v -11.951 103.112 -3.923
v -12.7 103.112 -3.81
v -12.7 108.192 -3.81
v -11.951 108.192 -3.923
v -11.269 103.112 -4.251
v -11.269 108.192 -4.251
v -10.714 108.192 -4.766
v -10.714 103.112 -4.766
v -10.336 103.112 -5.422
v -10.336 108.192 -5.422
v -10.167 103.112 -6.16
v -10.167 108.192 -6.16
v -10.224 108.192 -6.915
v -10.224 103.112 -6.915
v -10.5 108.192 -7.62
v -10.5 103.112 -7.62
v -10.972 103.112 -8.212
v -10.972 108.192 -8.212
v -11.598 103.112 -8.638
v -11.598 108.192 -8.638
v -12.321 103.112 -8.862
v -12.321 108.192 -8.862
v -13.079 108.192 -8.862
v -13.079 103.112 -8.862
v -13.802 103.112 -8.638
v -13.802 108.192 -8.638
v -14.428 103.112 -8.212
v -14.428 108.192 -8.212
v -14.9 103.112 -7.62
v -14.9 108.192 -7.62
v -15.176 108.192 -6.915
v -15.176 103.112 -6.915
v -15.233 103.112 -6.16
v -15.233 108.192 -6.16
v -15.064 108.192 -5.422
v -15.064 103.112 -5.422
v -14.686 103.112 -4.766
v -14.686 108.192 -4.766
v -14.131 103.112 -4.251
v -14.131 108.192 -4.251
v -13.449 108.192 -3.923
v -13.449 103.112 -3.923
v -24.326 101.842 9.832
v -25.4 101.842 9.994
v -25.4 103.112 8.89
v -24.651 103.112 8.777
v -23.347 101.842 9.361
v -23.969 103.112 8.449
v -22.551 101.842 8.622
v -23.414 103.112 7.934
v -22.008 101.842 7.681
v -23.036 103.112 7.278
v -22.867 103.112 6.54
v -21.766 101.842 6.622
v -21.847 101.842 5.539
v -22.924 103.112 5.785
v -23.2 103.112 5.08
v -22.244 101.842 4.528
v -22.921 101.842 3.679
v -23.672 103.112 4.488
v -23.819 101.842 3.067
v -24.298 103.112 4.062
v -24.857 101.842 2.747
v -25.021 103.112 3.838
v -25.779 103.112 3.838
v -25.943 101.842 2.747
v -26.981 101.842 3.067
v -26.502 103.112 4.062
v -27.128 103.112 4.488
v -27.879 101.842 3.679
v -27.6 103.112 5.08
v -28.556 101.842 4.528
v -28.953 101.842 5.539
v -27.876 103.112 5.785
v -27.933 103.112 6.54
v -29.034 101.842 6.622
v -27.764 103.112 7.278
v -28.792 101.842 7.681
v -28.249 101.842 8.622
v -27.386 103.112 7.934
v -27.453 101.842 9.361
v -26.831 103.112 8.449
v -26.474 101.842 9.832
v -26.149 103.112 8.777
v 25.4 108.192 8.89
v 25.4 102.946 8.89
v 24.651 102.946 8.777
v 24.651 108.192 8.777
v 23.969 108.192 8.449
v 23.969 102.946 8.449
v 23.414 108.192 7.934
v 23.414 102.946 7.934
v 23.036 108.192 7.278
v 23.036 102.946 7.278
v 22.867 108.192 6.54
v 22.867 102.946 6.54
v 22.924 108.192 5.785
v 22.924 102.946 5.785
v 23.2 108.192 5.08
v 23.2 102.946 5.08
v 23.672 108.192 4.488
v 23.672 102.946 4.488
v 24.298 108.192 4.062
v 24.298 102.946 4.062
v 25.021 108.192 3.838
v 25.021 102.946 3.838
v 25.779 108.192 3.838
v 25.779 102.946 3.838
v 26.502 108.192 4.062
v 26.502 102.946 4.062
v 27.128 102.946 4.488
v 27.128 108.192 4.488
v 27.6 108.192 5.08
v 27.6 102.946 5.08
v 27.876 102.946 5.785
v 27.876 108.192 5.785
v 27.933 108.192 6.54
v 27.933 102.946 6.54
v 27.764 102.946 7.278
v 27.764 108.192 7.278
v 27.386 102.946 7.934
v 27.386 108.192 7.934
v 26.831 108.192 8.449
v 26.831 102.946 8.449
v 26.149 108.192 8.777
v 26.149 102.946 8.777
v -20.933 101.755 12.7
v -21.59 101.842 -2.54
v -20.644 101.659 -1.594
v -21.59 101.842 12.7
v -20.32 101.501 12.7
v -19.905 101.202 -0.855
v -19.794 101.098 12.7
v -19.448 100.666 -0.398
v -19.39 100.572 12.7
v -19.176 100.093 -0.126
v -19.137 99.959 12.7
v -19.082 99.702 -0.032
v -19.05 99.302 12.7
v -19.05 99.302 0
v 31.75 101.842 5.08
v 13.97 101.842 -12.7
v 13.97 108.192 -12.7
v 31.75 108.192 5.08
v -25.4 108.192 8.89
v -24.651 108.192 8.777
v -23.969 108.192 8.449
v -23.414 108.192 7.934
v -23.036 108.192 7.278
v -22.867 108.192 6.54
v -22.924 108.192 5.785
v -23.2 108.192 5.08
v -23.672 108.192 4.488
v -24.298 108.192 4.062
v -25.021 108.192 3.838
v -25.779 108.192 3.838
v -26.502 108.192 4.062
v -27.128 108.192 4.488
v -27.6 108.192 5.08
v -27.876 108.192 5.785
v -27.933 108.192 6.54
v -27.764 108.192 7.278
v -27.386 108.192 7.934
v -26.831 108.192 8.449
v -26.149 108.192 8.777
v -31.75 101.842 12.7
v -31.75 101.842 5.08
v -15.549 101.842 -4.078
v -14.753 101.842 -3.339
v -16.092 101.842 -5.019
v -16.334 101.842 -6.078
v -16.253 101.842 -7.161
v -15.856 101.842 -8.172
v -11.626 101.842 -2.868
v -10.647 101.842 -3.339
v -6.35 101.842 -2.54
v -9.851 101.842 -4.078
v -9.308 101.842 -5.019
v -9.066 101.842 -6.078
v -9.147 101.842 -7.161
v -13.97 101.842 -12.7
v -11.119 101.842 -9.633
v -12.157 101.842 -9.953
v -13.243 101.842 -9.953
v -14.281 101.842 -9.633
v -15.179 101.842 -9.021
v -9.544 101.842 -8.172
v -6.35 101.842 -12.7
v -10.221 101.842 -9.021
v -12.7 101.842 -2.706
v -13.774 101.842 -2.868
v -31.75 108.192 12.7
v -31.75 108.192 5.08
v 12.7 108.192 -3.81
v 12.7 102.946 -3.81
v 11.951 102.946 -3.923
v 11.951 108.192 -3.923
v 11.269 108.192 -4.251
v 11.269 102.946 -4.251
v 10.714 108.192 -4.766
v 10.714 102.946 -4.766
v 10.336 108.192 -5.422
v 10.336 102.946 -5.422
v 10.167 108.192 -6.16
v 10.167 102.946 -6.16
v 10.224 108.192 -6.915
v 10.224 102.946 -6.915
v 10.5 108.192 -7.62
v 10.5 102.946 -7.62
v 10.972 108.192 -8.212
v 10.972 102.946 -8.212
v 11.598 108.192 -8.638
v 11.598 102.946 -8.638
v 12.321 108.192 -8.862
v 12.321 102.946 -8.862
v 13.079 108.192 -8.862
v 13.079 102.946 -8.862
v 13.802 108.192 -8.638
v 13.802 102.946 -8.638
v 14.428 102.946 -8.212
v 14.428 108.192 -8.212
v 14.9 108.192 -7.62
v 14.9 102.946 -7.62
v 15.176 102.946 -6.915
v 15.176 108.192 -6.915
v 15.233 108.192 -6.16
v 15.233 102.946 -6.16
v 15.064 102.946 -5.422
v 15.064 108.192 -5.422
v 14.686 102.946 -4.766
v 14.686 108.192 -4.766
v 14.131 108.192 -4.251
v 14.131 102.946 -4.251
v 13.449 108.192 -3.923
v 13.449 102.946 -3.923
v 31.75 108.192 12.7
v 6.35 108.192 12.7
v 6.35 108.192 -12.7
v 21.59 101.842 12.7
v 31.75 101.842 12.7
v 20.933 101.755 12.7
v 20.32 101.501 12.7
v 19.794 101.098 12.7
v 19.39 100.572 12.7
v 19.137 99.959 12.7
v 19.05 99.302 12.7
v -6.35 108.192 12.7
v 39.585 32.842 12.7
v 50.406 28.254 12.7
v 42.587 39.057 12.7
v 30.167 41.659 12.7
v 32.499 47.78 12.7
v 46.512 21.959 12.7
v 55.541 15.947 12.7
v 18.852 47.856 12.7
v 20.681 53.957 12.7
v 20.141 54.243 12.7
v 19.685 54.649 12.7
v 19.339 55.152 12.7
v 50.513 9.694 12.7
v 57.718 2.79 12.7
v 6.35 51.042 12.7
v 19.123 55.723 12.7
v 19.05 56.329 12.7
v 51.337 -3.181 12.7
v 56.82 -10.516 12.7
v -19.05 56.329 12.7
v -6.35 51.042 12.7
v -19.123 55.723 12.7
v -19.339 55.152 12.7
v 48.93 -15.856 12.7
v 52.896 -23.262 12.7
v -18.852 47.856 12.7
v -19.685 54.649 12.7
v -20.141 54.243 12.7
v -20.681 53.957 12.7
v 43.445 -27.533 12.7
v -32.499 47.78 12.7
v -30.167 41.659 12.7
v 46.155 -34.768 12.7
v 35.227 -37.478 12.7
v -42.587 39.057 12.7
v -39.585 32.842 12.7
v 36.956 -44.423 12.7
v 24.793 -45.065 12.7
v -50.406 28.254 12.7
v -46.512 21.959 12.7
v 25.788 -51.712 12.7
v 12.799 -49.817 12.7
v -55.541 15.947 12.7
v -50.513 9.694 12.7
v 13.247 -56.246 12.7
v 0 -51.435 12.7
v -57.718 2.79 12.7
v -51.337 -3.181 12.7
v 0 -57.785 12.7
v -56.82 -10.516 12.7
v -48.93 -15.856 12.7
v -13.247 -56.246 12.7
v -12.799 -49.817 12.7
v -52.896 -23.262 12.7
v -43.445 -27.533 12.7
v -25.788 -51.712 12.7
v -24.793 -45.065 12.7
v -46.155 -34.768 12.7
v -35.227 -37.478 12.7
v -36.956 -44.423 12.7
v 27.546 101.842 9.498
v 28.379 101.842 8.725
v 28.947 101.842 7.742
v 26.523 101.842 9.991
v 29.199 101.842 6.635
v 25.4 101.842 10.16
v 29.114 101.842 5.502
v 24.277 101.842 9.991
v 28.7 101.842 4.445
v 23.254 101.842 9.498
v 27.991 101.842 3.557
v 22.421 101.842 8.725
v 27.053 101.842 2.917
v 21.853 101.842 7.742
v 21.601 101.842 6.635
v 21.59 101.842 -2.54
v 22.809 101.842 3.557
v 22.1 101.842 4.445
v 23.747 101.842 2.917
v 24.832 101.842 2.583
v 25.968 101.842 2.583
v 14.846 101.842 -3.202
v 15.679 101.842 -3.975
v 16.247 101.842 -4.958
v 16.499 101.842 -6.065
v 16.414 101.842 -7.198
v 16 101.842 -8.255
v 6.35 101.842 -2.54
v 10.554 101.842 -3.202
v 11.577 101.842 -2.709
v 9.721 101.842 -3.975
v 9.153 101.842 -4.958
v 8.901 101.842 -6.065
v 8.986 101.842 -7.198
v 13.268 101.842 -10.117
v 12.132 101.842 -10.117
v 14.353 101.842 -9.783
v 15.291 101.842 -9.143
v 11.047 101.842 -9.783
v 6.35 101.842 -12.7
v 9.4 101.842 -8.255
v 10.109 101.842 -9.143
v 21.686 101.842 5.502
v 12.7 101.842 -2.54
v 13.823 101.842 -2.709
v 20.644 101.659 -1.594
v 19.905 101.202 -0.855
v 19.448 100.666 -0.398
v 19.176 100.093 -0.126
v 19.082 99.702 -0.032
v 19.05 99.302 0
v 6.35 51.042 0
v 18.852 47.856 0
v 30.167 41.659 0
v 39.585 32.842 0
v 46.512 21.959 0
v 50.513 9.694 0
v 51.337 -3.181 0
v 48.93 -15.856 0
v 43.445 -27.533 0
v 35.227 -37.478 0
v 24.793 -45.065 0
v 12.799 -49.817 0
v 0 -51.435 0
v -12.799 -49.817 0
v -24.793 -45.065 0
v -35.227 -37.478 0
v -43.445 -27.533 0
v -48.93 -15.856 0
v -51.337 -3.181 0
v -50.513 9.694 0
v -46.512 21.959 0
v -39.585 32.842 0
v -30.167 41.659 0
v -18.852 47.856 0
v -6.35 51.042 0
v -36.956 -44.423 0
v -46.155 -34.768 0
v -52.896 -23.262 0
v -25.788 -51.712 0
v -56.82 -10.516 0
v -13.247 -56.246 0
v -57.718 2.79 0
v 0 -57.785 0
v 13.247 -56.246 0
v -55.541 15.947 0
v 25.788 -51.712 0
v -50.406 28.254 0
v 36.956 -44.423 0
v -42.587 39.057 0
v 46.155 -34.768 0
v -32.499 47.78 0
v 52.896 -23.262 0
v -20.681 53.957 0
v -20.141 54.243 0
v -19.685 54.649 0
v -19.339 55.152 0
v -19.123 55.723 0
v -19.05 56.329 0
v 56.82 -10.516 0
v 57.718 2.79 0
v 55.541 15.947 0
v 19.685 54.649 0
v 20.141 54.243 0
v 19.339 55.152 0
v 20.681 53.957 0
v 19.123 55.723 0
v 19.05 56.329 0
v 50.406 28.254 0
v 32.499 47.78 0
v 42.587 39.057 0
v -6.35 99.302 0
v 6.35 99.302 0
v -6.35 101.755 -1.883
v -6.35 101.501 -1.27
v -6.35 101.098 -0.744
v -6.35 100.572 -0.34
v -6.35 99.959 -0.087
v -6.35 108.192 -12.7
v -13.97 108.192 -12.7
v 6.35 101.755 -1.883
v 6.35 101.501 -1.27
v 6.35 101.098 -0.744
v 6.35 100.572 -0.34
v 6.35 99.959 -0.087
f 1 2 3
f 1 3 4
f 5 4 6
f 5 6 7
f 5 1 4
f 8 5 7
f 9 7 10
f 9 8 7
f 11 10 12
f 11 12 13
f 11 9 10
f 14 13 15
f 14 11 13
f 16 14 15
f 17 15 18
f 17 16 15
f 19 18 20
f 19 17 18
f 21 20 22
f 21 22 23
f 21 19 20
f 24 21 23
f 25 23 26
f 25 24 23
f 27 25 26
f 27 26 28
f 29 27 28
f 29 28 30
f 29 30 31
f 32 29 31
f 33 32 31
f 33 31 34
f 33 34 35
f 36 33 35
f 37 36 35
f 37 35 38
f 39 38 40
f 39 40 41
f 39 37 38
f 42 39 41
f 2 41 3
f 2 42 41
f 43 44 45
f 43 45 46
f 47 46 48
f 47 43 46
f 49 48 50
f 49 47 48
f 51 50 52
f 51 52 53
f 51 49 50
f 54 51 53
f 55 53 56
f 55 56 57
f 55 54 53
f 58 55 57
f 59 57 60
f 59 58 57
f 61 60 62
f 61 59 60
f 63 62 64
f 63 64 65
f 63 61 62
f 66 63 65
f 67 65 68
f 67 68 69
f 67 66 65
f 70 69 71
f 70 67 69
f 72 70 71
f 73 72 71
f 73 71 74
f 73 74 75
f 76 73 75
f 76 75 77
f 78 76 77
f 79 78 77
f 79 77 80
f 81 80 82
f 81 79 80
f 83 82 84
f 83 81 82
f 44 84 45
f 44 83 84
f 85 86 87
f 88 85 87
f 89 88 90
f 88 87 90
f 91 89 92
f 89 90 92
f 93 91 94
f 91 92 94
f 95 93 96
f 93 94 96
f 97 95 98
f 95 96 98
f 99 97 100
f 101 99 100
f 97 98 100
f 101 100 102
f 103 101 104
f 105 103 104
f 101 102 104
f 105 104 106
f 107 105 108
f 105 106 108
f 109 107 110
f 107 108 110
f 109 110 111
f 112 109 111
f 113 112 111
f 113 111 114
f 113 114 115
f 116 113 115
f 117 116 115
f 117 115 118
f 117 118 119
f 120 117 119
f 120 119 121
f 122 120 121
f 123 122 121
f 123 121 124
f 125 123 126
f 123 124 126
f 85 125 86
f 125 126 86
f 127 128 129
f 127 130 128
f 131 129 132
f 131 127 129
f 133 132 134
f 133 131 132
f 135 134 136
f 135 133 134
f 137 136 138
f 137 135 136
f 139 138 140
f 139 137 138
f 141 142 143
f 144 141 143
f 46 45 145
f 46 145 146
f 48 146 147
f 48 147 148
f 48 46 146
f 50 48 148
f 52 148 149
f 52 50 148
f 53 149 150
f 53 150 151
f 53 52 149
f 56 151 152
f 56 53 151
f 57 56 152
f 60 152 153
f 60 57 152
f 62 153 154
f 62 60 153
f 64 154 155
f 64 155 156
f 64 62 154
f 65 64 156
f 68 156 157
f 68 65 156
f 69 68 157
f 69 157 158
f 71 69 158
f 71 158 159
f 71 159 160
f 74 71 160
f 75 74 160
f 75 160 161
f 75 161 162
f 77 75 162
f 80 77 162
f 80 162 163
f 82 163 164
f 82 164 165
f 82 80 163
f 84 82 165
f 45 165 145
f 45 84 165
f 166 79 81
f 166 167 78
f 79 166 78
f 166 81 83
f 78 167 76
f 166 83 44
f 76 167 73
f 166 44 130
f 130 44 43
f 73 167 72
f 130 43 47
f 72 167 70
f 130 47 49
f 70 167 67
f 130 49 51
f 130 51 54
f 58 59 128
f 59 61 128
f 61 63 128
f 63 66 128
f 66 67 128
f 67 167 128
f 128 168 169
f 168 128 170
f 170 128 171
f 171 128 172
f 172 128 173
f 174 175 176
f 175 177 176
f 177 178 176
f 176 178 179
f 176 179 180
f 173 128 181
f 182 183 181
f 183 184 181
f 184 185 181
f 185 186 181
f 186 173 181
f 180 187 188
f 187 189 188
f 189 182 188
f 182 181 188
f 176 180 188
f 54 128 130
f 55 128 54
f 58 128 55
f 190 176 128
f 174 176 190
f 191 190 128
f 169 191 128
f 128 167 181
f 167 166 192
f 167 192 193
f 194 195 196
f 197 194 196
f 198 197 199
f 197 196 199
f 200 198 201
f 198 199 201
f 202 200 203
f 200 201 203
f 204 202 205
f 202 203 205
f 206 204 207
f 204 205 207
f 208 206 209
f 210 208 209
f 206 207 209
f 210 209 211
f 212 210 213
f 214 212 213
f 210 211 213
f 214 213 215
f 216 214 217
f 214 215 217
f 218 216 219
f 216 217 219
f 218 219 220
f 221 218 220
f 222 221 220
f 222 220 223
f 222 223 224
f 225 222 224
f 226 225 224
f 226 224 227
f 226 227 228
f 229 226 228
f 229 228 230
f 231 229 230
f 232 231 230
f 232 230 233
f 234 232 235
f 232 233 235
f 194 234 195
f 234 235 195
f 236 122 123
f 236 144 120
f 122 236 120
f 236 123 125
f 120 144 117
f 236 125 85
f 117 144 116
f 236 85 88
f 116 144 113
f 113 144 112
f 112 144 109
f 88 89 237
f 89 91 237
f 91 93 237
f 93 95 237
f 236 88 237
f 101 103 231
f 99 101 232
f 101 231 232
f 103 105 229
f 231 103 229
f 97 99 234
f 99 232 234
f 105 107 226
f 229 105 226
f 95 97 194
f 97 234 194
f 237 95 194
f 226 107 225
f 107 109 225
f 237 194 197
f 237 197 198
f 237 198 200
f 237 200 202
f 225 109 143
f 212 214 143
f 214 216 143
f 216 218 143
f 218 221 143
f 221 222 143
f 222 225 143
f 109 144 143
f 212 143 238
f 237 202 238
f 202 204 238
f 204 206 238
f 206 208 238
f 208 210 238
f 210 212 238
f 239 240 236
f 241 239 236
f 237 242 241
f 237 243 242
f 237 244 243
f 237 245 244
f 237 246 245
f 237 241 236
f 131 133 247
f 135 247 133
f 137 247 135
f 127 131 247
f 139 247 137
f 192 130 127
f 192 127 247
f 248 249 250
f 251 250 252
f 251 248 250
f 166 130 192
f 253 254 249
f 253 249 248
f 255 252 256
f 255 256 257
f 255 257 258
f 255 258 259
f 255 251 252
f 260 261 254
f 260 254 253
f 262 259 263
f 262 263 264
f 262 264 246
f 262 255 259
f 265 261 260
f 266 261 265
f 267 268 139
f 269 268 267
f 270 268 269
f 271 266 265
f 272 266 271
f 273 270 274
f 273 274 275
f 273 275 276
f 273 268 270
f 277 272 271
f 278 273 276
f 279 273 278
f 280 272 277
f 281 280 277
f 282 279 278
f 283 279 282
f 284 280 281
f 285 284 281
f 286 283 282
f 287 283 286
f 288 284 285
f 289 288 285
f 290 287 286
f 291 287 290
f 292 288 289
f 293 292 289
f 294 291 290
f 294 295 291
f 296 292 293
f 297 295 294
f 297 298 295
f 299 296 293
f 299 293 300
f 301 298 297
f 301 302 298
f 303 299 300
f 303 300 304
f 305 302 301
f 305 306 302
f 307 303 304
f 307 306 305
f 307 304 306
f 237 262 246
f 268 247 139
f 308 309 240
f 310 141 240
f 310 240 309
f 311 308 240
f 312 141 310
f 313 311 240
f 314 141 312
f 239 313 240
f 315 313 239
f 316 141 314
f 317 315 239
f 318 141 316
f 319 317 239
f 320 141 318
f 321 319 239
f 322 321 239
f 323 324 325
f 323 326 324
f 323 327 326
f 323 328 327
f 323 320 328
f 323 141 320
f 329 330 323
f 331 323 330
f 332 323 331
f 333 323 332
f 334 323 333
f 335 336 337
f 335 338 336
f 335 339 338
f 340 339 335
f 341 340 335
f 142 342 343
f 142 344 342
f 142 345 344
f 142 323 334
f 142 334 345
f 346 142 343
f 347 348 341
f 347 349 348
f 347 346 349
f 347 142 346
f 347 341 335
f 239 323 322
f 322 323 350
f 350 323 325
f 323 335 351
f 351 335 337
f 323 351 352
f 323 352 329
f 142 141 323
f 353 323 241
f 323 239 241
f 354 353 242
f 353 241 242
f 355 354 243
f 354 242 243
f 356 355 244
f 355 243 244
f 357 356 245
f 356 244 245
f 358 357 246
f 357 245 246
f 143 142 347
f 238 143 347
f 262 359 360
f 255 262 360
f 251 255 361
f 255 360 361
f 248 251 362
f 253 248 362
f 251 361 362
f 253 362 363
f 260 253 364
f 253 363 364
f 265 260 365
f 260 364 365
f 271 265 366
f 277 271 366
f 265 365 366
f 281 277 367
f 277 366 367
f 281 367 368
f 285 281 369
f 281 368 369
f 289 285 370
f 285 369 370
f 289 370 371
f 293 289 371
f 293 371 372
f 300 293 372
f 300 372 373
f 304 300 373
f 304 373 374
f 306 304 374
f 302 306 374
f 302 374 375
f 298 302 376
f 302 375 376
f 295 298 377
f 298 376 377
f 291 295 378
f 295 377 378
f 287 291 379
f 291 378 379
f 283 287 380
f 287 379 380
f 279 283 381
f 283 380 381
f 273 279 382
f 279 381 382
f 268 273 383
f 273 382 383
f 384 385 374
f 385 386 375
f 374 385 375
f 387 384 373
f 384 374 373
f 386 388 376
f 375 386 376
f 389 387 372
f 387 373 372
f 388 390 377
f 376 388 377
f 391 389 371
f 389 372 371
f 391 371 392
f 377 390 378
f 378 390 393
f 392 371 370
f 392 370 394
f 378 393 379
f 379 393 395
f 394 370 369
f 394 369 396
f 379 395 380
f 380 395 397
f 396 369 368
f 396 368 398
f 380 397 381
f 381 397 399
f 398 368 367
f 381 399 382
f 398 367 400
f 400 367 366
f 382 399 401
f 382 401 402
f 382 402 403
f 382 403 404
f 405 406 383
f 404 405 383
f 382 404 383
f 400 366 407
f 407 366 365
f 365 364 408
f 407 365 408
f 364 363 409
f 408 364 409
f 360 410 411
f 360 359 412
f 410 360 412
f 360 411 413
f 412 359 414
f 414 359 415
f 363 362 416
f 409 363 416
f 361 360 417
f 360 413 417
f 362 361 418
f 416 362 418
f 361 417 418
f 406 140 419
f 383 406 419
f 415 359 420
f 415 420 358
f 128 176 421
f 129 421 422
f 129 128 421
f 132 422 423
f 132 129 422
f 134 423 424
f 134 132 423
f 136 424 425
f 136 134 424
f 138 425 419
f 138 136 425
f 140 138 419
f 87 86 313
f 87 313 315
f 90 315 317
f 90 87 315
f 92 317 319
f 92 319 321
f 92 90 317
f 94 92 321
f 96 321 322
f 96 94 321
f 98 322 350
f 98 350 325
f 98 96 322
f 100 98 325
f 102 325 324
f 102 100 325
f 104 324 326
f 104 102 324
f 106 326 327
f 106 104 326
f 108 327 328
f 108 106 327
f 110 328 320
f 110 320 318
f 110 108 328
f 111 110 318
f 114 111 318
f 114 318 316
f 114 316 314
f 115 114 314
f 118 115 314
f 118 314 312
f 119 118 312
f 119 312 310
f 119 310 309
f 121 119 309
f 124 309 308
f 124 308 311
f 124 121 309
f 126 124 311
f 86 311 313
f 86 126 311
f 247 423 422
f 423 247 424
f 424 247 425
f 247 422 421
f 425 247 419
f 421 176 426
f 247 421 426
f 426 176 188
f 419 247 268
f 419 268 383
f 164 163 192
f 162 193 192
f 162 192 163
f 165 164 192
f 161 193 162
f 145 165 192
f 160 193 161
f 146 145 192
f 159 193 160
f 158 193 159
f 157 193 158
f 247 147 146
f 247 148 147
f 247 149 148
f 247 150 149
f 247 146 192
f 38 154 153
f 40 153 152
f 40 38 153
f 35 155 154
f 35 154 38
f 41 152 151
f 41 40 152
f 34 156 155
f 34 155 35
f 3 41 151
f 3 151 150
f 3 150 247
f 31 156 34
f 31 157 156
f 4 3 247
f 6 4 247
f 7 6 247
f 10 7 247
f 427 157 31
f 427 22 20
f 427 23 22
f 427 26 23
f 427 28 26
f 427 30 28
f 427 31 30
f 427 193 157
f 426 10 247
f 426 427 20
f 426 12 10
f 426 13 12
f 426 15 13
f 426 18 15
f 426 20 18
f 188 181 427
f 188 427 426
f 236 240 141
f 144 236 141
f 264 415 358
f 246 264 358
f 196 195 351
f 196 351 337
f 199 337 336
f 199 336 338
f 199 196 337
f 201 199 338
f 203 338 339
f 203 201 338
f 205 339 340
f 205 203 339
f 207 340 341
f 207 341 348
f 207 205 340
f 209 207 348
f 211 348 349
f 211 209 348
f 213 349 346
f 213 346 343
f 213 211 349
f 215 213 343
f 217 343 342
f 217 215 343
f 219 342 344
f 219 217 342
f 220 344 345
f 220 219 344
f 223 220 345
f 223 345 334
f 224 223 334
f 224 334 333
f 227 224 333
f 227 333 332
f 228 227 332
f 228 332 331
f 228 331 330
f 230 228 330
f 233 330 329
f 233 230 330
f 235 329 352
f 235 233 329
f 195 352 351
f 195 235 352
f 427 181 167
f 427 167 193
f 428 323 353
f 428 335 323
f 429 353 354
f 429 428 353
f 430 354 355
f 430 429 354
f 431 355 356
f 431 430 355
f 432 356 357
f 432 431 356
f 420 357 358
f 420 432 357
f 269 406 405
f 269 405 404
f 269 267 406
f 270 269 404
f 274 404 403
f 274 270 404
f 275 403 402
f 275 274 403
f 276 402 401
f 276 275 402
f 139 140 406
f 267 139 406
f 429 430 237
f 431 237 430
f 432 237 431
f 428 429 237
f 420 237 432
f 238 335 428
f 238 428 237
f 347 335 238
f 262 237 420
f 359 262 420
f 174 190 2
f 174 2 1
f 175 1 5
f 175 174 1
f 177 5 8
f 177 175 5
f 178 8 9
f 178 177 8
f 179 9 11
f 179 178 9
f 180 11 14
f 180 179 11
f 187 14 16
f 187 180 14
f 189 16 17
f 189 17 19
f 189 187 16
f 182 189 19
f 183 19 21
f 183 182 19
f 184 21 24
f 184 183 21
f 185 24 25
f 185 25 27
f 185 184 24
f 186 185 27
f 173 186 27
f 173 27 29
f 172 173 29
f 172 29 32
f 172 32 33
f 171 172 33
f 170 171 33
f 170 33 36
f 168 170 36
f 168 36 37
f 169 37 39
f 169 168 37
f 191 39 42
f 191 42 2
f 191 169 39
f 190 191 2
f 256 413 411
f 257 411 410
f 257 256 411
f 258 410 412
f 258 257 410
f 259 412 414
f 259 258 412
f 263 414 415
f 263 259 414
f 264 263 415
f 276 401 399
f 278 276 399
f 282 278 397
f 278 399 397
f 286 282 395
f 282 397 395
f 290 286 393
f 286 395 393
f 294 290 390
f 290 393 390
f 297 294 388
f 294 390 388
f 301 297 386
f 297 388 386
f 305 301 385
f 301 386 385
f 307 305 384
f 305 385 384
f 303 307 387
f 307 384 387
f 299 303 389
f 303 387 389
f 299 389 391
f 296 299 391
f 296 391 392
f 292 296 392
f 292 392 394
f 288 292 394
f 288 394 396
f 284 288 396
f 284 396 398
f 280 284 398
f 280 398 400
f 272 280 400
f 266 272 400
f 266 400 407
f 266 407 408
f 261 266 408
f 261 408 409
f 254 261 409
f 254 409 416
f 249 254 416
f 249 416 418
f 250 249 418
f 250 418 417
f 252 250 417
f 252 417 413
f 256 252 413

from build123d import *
from OCP.BRepFilletAPI import BRepFilletAPI_MakeChamfer

# Parameters (mm, degrees)
BOSS_EXTRUDE1_DEPTH = 12.7
SKETCH2_W           = 25.4
SKETCH2_H           = 25.4
SKETCH2_R           = 2.54
BOSS_EXTRUDE2_DEPTH = 6.35
CHAMFER2_SIZE       = 1.27
CHAMFER2_SIZE2      = 1.103994157
CHAMFER3_SIZE       = 17.78
FILLET3_R           = 2.54


with BuildPart() as part:
    # Sketch1 → Boss-Extrude1 (new body)
    with BuildSketch(Plane.XY):
        with BuildLine():
            Line((-6.35, 51.041519619), (-6.35, 101.841519619))
            Line((-6.35, 101.841519619), (-19.05, 101.841519619))
            Line((-19.05, 101.841519619), (-19.05, 54.554593986))
            ThreePointArc((-19.05, 54.554593986), (0, -57.785), (19.05, 54.554593986))
            Line((19.05, 54.554593986), (19.05, 101.841519619))
            Line((19.05, 101.841519619), (6.35, 101.841519619))
            Line((6.35, 101.841519619), (6.35, 51.041519619))
            ThreePointArc((6.35, 51.041519619), (0, -51.435), (-6.35, 51.041519619))
        make_face()
    extrude(amount=BOSS_EXTRUDE1_DEPTH)

    # Sketch2 → Boss-Extrude2 (add)
    with BuildSketch(Plane(origin=(0, 101.841519619, 0), x_dir=(1, 0, 0), z_dir=(0, 1, 0))):
        with Locations((-19.05, 0)):
            Rectangle(SKETCH2_W, SKETCH2_H)
        with Locations(Location((-25.4, -6.35, 0), (0, 0, 270))):
            Circle(SKETCH2_R, mode=Mode.SUBTRACT)
        with Locations(Location((-12.7, 6.35, 0), (0, 0, 270))):
            Circle(SKETCH2_R, mode=Mode.SUBTRACT)
    boss_extrude2 = extrude(amount=BOSS_EXTRUDE2_DEPTH)

    # Mirror5: Boss-Extrude2 across plane
    add(boss_extrude2.mirror(Plane(origin=(0, 0, 0), x_dir=(0, 0, 1), z_dir=(1, 0, 0))))

    # Chamfer2: one chamfer whose edges measure the first distance from different faces: ONE call of the kernel's chamfer builder (chamfer() names one face for all edges)
    chamfer2_edges_1 = [part.edges().sort_by_distance(p)[0] for p in [
        (-12.7, 101.841519619, -8.89),
    ]]
    chamfer2_side_1 = [part.faces().sort_by_distance(p)[0] for p in [
        (-12.7, 105.016519619, -8.89),
    ]]
    chamfer2_edges_2 = [part.edges().sort_by_distance(p)[0] for p in [
        (-25.4, 101.841519619, 3.81),
    ]]
    chamfer2_side_2 = [part.faces().sort_by_distance(p)[0] for p in [
        (-25.4, 105.016519619, 3.81),
    ]]
    chamfer2_edges_3 = [part.edges().sort_by_distance(p)[0] for p in [
        (12.7, 101.841519619, -8.89),
        (25.4, 101.841519619, 3.81),
    ]]
    chamfer2_side_3 = [part.faces().sort_by_distance(p)[0] for p in [
        (21.360206035, 101.841519619, -2.310206035),
    ]]
    chamfer2 = BRepFilletAPI_MakeChamfer(part.part.solid().wrapped)
    for e in chamfer2_edges_1:
        chamfer2.Add(CHAMFER2_SIZE, CHAMFER2_SIZE2, e.wrapped, chamfer2_side_1[0].wrapped)  # the first distance lies on this face
    for e in chamfer2_edges_2:
        chamfer2.Add(CHAMFER2_SIZE, CHAMFER2_SIZE2, e.wrapped, chamfer2_side_2[0].wrapped)  # the first distance lies on this face
    for e in chamfer2_edges_3:
        chamfer2.Add(CHAMFER2_SIZE, CHAMFER2_SIZE2, e.wrapped, chamfer2_side_3[0].wrapped)  # the first distance lies on this face
    add(Compound.cast(chamfer2.Shape()), mode=Mode.REPLACE)

    # Chamfer3
    chamfer3_edges = [part.edges().sort_by_distance(p)[0] for p in [
        (-31.75, 105.016519619, -12.7),
        (31.75, 105.016519619, -12.7),
    ]]
    chamfer(chamfer3_edges, length=CHAMFER3_SIZE)

    # Fillet3
    fillet3_edges = [part.edges().sort_by_distance(p)[0] for p in [
        (12.7, 101.841519619, 0),
        (-19.05, 54.554593986, 6.35),
        (-19.05, 101.841519619, 6.35),
        (19.05, 101.841519619, 6.35),
        (19.05, 54.554593986, 6.35),
        (-12.7, 101.841519619, 0),
    ]]
    fillet(fillet3_edges, radius=FILLET3_R - 0.0001)  # a hair under: the kernel refuses the full size


solid = part.part
